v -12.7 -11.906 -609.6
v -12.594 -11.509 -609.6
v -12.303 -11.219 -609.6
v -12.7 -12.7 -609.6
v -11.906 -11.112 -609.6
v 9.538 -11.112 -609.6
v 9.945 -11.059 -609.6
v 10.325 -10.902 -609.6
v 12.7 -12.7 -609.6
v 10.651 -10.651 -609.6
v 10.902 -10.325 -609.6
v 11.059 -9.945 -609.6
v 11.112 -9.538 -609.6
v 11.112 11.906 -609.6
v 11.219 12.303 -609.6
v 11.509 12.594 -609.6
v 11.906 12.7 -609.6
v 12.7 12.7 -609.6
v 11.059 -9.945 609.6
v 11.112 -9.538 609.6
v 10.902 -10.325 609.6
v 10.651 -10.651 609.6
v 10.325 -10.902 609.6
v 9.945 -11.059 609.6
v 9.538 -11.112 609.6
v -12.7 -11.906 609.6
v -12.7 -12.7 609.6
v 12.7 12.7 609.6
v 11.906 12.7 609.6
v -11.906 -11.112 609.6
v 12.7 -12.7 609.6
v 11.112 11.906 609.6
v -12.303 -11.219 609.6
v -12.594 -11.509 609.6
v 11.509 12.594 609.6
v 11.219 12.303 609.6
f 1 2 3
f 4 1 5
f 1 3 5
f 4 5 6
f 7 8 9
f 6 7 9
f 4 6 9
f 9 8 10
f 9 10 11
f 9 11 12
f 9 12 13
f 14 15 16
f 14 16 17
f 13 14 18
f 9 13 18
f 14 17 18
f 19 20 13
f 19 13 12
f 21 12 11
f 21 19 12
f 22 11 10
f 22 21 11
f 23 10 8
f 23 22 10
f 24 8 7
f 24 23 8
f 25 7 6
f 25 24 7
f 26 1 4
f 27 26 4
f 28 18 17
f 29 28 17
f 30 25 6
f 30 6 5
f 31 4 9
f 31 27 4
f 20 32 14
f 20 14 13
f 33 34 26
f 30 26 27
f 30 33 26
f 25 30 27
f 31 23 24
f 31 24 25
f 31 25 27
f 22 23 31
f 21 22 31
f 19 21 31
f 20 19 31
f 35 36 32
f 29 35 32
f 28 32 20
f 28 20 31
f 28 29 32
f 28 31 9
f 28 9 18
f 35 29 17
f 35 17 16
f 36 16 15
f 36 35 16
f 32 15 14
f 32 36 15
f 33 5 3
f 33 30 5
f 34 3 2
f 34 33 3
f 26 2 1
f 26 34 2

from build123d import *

# Parameters (mm, degrees)
BOSS_EXTRUDE1_DEPTH = 609.6


with BuildPart() as part:
    # Sketch2 → Boss-Extrude1 (new, symmetric)
    with BuildSketch(Plane.XY):
        with BuildLine():
            Line((-12.7, -12.7), (12.7, -12.7))
            Line((12.7, -12.7), (12.7, 12.7))
            Line((12.7, 12.7), (11.90625, 12.7))
            ThreePointArc((11.90625, 12.7), (11.344983992, 12.467516008), (11.1125, 11.90625))
            Line((11.1125, 11.90625), (11.1125, -9.5377))
            ThreePointArc((11.1125, -9.5377), (10.651251759, -10.651251759), (9.5377, -11.1125))
            Line((9.5377, -11.1125), (-11.90625, -11.1125))
            ThreePointArc((-11.90625, -11.1125), (-12.467516008, -11.344983992), (-12.7, -11.90625))
            Line((-12.7, -11.90625), (-12.7, -12.7))
        make_face()
    extrude(amount=BOSS_EXTRUDE1_DEPTH, both=True)


solid = part.part
